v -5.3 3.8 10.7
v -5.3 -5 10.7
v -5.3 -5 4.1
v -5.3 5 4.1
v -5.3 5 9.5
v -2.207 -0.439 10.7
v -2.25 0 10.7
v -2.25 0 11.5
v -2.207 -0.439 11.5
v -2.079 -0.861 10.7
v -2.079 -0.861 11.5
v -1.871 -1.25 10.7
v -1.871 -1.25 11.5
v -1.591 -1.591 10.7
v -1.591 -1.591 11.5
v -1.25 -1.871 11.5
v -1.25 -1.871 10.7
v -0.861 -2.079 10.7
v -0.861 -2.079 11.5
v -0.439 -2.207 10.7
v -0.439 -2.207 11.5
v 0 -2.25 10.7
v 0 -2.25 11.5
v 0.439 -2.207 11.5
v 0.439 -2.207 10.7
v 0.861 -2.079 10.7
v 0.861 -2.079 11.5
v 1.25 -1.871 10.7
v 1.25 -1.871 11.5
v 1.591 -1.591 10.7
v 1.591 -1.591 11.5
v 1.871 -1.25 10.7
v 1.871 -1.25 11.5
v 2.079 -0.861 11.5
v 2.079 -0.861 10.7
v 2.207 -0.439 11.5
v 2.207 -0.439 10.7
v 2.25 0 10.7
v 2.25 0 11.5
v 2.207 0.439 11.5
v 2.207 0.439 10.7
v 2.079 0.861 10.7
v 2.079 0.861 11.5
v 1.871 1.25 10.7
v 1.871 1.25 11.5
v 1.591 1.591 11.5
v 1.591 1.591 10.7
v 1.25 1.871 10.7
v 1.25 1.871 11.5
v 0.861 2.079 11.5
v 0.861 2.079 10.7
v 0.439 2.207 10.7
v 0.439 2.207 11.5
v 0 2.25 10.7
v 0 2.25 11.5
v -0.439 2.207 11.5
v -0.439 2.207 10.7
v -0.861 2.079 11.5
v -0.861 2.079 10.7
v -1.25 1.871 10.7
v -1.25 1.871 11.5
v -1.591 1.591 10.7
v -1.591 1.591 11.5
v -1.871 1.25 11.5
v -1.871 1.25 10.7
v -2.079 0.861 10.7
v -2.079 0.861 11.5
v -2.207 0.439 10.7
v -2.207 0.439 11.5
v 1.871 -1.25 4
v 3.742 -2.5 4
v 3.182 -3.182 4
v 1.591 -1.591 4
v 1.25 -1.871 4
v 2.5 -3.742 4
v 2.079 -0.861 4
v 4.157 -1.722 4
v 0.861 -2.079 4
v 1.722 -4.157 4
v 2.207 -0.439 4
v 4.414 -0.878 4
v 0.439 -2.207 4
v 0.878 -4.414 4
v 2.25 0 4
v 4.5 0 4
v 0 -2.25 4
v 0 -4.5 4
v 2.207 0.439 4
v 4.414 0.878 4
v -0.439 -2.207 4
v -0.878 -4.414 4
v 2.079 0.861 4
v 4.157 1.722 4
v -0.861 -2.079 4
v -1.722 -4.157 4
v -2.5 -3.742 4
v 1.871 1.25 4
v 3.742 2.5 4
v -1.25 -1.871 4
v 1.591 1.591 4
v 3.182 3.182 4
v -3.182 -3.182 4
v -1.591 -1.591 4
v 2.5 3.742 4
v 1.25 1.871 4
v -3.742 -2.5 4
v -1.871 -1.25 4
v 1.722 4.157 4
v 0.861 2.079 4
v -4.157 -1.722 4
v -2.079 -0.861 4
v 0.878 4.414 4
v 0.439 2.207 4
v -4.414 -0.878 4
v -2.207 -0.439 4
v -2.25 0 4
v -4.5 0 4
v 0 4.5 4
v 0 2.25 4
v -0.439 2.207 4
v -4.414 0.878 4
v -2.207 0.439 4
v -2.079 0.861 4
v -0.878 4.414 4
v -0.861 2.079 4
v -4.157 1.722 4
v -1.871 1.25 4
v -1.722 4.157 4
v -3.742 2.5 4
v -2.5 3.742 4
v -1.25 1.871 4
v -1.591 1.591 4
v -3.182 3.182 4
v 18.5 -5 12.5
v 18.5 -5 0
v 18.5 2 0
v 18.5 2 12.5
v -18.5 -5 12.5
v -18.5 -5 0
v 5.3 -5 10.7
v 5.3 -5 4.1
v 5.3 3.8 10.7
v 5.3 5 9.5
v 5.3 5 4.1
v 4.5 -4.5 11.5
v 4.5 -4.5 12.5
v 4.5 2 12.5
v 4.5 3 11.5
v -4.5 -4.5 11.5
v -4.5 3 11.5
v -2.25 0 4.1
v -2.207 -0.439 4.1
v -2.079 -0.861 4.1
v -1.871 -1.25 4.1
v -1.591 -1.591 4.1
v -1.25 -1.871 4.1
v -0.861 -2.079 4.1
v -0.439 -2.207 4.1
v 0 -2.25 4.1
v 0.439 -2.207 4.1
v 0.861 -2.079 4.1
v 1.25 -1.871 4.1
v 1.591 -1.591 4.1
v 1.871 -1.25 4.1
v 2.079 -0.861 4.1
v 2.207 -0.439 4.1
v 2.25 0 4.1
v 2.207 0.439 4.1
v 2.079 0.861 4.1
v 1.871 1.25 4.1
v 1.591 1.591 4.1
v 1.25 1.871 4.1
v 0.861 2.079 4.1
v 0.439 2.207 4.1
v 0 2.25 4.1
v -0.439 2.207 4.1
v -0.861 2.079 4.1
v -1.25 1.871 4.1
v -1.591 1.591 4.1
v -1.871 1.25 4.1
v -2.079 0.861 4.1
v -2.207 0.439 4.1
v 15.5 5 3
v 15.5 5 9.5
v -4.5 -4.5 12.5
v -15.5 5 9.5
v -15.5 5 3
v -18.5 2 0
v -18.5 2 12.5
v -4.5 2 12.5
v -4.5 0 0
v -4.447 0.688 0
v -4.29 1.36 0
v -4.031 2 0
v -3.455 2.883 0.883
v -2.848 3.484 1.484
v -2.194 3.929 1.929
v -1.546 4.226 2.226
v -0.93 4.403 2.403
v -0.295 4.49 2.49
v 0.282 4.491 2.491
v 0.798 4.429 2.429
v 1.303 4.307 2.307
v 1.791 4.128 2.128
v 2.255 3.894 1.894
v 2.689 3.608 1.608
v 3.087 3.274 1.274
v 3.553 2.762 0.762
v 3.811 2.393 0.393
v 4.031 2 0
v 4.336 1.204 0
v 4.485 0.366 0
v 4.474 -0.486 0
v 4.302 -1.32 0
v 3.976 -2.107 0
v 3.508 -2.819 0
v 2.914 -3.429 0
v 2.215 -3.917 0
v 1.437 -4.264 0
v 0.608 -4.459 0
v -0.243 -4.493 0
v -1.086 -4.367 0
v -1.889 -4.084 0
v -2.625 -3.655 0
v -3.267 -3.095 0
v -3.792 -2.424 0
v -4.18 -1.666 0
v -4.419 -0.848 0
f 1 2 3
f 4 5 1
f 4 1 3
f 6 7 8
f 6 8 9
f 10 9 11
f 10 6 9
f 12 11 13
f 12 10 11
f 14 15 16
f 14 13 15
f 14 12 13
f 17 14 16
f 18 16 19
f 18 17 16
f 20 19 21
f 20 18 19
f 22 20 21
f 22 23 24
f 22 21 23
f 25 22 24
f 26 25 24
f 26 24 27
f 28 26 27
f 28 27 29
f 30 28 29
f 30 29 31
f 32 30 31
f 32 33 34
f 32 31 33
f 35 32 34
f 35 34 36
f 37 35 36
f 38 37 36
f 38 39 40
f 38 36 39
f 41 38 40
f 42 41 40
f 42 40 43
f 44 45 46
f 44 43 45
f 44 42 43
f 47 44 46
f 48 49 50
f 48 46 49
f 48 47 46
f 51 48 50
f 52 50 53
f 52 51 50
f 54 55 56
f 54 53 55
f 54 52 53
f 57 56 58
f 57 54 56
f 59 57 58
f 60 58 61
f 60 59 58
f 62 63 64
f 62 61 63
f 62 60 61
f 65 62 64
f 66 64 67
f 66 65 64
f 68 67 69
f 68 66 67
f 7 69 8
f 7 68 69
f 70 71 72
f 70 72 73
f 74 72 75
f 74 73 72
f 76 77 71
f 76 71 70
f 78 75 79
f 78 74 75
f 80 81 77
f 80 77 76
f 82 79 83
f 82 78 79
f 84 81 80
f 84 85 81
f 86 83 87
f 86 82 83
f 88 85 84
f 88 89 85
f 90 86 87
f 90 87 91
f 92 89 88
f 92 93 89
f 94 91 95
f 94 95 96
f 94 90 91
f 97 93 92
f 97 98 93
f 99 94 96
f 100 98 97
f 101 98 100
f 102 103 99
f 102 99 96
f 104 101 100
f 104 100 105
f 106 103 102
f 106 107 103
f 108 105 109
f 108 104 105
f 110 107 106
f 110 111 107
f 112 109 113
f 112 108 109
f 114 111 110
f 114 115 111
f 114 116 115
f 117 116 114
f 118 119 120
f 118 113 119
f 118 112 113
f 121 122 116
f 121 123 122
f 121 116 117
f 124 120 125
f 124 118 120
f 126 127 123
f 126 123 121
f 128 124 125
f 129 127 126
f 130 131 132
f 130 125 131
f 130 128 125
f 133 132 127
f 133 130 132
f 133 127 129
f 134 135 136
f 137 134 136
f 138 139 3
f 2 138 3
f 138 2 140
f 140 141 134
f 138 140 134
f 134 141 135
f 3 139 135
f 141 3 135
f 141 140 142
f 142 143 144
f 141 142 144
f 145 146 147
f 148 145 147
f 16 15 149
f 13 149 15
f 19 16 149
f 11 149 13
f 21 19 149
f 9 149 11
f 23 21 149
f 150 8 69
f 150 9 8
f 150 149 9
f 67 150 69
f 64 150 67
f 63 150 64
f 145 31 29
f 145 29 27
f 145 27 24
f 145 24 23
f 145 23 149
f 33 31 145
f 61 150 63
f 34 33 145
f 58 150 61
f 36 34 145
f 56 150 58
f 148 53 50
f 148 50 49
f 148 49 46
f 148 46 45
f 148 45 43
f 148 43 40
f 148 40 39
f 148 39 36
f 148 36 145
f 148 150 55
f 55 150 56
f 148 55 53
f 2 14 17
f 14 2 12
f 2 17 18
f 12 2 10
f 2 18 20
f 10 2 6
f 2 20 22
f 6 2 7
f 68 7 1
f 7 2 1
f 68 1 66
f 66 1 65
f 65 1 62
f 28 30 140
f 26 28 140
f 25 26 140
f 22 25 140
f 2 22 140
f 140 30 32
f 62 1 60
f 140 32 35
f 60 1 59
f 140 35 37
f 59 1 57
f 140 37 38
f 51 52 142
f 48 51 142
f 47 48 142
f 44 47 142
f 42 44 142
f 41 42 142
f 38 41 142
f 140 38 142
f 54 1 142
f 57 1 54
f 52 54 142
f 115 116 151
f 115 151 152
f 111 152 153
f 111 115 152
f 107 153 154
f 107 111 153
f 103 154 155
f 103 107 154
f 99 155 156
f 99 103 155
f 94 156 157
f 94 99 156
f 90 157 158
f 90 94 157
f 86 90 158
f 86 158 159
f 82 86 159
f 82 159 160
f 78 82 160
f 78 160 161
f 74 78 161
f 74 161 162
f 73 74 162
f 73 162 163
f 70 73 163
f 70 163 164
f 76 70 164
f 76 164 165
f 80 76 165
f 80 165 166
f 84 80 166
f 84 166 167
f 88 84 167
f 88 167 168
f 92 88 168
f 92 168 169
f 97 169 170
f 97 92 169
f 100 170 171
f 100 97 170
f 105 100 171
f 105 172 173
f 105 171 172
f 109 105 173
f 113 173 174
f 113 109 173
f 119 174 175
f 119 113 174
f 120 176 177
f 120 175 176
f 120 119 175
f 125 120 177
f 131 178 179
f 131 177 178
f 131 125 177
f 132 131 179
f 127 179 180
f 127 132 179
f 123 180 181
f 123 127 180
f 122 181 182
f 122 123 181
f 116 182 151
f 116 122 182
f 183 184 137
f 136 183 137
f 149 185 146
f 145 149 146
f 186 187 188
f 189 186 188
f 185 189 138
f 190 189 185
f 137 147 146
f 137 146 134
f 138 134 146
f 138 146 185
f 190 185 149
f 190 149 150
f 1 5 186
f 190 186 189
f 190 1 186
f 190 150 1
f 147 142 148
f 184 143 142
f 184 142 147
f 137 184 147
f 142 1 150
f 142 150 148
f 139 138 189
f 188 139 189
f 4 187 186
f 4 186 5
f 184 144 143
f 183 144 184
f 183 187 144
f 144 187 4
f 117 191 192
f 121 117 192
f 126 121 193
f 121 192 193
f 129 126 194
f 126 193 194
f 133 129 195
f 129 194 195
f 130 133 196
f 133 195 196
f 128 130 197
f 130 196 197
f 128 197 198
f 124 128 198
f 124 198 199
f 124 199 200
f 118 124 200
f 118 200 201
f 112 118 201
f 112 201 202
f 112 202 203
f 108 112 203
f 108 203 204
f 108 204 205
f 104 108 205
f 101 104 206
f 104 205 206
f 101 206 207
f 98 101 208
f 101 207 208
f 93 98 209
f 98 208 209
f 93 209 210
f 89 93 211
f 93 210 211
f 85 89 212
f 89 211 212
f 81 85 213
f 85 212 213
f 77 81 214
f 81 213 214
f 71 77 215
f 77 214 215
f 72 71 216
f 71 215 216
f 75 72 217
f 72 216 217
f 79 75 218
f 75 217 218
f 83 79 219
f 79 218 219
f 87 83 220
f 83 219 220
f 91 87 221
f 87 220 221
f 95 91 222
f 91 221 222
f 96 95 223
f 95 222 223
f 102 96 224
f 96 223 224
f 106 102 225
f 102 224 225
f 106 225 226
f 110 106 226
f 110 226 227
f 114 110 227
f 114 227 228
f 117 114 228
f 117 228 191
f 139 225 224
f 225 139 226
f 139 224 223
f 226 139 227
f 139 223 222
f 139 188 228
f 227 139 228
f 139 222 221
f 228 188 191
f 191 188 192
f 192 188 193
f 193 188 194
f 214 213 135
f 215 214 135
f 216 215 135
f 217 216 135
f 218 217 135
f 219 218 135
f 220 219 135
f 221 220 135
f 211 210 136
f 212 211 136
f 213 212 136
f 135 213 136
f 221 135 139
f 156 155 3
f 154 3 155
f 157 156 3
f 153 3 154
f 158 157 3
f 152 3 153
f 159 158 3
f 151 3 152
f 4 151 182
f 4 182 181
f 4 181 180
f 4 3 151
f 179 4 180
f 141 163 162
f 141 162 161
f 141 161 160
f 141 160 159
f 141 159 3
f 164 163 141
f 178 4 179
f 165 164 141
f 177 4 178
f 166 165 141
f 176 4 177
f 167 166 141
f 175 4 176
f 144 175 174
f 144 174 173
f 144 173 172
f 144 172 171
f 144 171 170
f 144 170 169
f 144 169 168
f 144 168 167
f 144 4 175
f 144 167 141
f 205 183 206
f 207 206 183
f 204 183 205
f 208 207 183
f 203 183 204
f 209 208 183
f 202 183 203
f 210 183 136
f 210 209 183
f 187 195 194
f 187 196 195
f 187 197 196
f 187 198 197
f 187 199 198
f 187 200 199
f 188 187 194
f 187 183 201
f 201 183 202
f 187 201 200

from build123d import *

# Parameters (mm, degrees)
SKETCH_1_W          = 37
SKETCH_1_H          = 10
EXTRUDE_1_DEPTH     = 4.5
SKETCH_4_W          = 13.4
SKETCH_4_H          = 10
EXTRUDE_2_DEPTH     = 6
SKETCH_5_W          = 10.2
SKETCH_5_H          = 10
CUT_EXTRUDE_4_DEPTH = 0.2
SKETCH_6_W          = 37
SKETCH_6_H          = 10
EXTRUDE_3_DEPTH     = 2
SKETCH_2_R          = 2.25
CUT_EXTRUDE_1_DEPTH = 23.880122377
SKETCH_3_R          = 4.5
CUT_EXTRUDE_3_DEPTH = 4
SKETCH_7_W          = 9
SKETCH_7_H          = 9
CUT_EXTRUDE_5_DEPTH = 1
CHAMFER_1_SIZE      = 3
SKETCH_8_W          = 10.6
SKETCH_8_H          = 6.6
CUT_EXTRUDE_6_DEPTH = 25.464259645


with BuildPart() as part:
    # 스케치1 → 보스-돌출1 (new body)
    with BuildSketch(Plane.XY):
        Rectangle(SKETCH_1_W, SKETCH_1_H)
    extrude(amount=EXTRUDE_1_DEPTH)

    # 스케치4 → 보스-돌출2 (add)
    with BuildSketch(Plane.XY.offset(4.5)):
        with Locations((-11.8, 0)):
            Rectangle(SKETCH_4_W, SKETCH_4_H)
        with Locations((11.8, 0)):
            Rectangle(SKETCH_4_W, SKETCH_4_H)
    extrude(amount=EXTRUDE_2_DEPTH)

    # 스케치5 → 컷-돌출4 (cut)
    with BuildSketch(Plane.XY.offset(4.5)):
        Rectangle(SKETCH_5_W, SKETCH_5_H)
    extrude(amount=-CUT_EXTRUDE_4_DEPTH, mode=Mode.SUBTRACT)

    # 스케치6 → 보스-돌출3 (add)
    with BuildSketch(Plane.XY.offset(10.5)):
        Rectangle(SKETCH_6_W, SKETCH_6_H)
    extrude(amount=EXTRUDE_3_DEPTH)

    # 스케치2 → 컷-돌출1 (cut, through all)
    with BuildSketch(Plane.XY):
        with Locations(Location((0, 0, 0), (0, 0, 180))):
            Circle(SKETCH_2_R)
    extrude(amount=CUT_EXTRUDE_1_DEPTH, mode=Mode.SUBTRACT)

    # 스케치3 → 컷-돌출3 (cut)
    with BuildSketch(Plane(origin=(0, 0, 0), x_dir=(-1, 0, 0), z_dir=(0, 0, -1))):
        Circle(SKETCH_3_R)
    extrude(amount=-CUT_EXTRUDE_3_DEPTH, mode=Mode.SUBTRACT)

    # 스케치7 → 컷-돌출5 (cut)
    with BuildSketch(Plane.XY.offset(12.5)):
        Rectangle(SKETCH_7_W, SKETCH_7_H)
    extrude(amount=-CUT_EXTRUDE_5_DEPTH, mode=Mode.SUBTRACT)

    # 모따기1
    # the kernel refuses this chamfer: 3 mm, written as the material it takes off along each edge
    with BuildSketch(Plane(origin=(-26.215048964, 5, 0), x_dir=(0, 0.02749587661058649, 0.9996219169112968), z_dir=(1, 0, 0)), Plane(origin=(26.215048964, 5, 12.5), x_dir=(0, 0.027495876610586494, -0.9996219169112968), z_dir=(-1, 0, 0))) as chamfer_1_piece_1:
        Polygon((CHAMFER_1_SIZE * 0.999621916911, CHAMFER_1_SIZE * 0.0274958766106), (-CHAMFER_1_SIZE * 0.0274958766106, CHAMFER_1_SIZE * 0.999621916911), (0, 0), align=None)
    extrude(amount=52.430097928, mode=Mode.SUBTRACT)
    with BuildSketch(Plane(origin=(18.5, 5, 20.215048964), x_dir=(-0.9996219169112969, 0.027495876610586497, 0), z_dir=(0, 0, -1)), Plane(origin=(-18.5, 5, -7.715048964), x_dir=(0.9996219169112969, 0.027495876610586497, 0), z_dir=(0, 0, 1))) as chamfer_1_piece_2:
        Polygon((CHAMFER_1_SIZE * 0.999621916911, -CHAMFER_1_SIZE * 0.0274958766106), (-CHAMFER_1_SIZE * 0.0274958766106, -CHAMFER_1_SIZE * 0.999621916911), (0, 0), align=None)
    extrude(amount=27.930097928, mode=Mode.SUBTRACT)

    # 스케치8 → 컷-돌출6 (cut, through all)
    with BuildSketch(Plane(origin=(0, 5, 0), x_dir=(1, 0, 0), z_dir=(0, 1, 0))):
        with Locations((0, -7.4)):
            Rectangle(SKETCH_8_W, SKETCH_8_H)
    extrude(amount=-CUT_EXTRUDE_6_DEPTH, mode=Mode.SUBTRACT)


solid = part.part
